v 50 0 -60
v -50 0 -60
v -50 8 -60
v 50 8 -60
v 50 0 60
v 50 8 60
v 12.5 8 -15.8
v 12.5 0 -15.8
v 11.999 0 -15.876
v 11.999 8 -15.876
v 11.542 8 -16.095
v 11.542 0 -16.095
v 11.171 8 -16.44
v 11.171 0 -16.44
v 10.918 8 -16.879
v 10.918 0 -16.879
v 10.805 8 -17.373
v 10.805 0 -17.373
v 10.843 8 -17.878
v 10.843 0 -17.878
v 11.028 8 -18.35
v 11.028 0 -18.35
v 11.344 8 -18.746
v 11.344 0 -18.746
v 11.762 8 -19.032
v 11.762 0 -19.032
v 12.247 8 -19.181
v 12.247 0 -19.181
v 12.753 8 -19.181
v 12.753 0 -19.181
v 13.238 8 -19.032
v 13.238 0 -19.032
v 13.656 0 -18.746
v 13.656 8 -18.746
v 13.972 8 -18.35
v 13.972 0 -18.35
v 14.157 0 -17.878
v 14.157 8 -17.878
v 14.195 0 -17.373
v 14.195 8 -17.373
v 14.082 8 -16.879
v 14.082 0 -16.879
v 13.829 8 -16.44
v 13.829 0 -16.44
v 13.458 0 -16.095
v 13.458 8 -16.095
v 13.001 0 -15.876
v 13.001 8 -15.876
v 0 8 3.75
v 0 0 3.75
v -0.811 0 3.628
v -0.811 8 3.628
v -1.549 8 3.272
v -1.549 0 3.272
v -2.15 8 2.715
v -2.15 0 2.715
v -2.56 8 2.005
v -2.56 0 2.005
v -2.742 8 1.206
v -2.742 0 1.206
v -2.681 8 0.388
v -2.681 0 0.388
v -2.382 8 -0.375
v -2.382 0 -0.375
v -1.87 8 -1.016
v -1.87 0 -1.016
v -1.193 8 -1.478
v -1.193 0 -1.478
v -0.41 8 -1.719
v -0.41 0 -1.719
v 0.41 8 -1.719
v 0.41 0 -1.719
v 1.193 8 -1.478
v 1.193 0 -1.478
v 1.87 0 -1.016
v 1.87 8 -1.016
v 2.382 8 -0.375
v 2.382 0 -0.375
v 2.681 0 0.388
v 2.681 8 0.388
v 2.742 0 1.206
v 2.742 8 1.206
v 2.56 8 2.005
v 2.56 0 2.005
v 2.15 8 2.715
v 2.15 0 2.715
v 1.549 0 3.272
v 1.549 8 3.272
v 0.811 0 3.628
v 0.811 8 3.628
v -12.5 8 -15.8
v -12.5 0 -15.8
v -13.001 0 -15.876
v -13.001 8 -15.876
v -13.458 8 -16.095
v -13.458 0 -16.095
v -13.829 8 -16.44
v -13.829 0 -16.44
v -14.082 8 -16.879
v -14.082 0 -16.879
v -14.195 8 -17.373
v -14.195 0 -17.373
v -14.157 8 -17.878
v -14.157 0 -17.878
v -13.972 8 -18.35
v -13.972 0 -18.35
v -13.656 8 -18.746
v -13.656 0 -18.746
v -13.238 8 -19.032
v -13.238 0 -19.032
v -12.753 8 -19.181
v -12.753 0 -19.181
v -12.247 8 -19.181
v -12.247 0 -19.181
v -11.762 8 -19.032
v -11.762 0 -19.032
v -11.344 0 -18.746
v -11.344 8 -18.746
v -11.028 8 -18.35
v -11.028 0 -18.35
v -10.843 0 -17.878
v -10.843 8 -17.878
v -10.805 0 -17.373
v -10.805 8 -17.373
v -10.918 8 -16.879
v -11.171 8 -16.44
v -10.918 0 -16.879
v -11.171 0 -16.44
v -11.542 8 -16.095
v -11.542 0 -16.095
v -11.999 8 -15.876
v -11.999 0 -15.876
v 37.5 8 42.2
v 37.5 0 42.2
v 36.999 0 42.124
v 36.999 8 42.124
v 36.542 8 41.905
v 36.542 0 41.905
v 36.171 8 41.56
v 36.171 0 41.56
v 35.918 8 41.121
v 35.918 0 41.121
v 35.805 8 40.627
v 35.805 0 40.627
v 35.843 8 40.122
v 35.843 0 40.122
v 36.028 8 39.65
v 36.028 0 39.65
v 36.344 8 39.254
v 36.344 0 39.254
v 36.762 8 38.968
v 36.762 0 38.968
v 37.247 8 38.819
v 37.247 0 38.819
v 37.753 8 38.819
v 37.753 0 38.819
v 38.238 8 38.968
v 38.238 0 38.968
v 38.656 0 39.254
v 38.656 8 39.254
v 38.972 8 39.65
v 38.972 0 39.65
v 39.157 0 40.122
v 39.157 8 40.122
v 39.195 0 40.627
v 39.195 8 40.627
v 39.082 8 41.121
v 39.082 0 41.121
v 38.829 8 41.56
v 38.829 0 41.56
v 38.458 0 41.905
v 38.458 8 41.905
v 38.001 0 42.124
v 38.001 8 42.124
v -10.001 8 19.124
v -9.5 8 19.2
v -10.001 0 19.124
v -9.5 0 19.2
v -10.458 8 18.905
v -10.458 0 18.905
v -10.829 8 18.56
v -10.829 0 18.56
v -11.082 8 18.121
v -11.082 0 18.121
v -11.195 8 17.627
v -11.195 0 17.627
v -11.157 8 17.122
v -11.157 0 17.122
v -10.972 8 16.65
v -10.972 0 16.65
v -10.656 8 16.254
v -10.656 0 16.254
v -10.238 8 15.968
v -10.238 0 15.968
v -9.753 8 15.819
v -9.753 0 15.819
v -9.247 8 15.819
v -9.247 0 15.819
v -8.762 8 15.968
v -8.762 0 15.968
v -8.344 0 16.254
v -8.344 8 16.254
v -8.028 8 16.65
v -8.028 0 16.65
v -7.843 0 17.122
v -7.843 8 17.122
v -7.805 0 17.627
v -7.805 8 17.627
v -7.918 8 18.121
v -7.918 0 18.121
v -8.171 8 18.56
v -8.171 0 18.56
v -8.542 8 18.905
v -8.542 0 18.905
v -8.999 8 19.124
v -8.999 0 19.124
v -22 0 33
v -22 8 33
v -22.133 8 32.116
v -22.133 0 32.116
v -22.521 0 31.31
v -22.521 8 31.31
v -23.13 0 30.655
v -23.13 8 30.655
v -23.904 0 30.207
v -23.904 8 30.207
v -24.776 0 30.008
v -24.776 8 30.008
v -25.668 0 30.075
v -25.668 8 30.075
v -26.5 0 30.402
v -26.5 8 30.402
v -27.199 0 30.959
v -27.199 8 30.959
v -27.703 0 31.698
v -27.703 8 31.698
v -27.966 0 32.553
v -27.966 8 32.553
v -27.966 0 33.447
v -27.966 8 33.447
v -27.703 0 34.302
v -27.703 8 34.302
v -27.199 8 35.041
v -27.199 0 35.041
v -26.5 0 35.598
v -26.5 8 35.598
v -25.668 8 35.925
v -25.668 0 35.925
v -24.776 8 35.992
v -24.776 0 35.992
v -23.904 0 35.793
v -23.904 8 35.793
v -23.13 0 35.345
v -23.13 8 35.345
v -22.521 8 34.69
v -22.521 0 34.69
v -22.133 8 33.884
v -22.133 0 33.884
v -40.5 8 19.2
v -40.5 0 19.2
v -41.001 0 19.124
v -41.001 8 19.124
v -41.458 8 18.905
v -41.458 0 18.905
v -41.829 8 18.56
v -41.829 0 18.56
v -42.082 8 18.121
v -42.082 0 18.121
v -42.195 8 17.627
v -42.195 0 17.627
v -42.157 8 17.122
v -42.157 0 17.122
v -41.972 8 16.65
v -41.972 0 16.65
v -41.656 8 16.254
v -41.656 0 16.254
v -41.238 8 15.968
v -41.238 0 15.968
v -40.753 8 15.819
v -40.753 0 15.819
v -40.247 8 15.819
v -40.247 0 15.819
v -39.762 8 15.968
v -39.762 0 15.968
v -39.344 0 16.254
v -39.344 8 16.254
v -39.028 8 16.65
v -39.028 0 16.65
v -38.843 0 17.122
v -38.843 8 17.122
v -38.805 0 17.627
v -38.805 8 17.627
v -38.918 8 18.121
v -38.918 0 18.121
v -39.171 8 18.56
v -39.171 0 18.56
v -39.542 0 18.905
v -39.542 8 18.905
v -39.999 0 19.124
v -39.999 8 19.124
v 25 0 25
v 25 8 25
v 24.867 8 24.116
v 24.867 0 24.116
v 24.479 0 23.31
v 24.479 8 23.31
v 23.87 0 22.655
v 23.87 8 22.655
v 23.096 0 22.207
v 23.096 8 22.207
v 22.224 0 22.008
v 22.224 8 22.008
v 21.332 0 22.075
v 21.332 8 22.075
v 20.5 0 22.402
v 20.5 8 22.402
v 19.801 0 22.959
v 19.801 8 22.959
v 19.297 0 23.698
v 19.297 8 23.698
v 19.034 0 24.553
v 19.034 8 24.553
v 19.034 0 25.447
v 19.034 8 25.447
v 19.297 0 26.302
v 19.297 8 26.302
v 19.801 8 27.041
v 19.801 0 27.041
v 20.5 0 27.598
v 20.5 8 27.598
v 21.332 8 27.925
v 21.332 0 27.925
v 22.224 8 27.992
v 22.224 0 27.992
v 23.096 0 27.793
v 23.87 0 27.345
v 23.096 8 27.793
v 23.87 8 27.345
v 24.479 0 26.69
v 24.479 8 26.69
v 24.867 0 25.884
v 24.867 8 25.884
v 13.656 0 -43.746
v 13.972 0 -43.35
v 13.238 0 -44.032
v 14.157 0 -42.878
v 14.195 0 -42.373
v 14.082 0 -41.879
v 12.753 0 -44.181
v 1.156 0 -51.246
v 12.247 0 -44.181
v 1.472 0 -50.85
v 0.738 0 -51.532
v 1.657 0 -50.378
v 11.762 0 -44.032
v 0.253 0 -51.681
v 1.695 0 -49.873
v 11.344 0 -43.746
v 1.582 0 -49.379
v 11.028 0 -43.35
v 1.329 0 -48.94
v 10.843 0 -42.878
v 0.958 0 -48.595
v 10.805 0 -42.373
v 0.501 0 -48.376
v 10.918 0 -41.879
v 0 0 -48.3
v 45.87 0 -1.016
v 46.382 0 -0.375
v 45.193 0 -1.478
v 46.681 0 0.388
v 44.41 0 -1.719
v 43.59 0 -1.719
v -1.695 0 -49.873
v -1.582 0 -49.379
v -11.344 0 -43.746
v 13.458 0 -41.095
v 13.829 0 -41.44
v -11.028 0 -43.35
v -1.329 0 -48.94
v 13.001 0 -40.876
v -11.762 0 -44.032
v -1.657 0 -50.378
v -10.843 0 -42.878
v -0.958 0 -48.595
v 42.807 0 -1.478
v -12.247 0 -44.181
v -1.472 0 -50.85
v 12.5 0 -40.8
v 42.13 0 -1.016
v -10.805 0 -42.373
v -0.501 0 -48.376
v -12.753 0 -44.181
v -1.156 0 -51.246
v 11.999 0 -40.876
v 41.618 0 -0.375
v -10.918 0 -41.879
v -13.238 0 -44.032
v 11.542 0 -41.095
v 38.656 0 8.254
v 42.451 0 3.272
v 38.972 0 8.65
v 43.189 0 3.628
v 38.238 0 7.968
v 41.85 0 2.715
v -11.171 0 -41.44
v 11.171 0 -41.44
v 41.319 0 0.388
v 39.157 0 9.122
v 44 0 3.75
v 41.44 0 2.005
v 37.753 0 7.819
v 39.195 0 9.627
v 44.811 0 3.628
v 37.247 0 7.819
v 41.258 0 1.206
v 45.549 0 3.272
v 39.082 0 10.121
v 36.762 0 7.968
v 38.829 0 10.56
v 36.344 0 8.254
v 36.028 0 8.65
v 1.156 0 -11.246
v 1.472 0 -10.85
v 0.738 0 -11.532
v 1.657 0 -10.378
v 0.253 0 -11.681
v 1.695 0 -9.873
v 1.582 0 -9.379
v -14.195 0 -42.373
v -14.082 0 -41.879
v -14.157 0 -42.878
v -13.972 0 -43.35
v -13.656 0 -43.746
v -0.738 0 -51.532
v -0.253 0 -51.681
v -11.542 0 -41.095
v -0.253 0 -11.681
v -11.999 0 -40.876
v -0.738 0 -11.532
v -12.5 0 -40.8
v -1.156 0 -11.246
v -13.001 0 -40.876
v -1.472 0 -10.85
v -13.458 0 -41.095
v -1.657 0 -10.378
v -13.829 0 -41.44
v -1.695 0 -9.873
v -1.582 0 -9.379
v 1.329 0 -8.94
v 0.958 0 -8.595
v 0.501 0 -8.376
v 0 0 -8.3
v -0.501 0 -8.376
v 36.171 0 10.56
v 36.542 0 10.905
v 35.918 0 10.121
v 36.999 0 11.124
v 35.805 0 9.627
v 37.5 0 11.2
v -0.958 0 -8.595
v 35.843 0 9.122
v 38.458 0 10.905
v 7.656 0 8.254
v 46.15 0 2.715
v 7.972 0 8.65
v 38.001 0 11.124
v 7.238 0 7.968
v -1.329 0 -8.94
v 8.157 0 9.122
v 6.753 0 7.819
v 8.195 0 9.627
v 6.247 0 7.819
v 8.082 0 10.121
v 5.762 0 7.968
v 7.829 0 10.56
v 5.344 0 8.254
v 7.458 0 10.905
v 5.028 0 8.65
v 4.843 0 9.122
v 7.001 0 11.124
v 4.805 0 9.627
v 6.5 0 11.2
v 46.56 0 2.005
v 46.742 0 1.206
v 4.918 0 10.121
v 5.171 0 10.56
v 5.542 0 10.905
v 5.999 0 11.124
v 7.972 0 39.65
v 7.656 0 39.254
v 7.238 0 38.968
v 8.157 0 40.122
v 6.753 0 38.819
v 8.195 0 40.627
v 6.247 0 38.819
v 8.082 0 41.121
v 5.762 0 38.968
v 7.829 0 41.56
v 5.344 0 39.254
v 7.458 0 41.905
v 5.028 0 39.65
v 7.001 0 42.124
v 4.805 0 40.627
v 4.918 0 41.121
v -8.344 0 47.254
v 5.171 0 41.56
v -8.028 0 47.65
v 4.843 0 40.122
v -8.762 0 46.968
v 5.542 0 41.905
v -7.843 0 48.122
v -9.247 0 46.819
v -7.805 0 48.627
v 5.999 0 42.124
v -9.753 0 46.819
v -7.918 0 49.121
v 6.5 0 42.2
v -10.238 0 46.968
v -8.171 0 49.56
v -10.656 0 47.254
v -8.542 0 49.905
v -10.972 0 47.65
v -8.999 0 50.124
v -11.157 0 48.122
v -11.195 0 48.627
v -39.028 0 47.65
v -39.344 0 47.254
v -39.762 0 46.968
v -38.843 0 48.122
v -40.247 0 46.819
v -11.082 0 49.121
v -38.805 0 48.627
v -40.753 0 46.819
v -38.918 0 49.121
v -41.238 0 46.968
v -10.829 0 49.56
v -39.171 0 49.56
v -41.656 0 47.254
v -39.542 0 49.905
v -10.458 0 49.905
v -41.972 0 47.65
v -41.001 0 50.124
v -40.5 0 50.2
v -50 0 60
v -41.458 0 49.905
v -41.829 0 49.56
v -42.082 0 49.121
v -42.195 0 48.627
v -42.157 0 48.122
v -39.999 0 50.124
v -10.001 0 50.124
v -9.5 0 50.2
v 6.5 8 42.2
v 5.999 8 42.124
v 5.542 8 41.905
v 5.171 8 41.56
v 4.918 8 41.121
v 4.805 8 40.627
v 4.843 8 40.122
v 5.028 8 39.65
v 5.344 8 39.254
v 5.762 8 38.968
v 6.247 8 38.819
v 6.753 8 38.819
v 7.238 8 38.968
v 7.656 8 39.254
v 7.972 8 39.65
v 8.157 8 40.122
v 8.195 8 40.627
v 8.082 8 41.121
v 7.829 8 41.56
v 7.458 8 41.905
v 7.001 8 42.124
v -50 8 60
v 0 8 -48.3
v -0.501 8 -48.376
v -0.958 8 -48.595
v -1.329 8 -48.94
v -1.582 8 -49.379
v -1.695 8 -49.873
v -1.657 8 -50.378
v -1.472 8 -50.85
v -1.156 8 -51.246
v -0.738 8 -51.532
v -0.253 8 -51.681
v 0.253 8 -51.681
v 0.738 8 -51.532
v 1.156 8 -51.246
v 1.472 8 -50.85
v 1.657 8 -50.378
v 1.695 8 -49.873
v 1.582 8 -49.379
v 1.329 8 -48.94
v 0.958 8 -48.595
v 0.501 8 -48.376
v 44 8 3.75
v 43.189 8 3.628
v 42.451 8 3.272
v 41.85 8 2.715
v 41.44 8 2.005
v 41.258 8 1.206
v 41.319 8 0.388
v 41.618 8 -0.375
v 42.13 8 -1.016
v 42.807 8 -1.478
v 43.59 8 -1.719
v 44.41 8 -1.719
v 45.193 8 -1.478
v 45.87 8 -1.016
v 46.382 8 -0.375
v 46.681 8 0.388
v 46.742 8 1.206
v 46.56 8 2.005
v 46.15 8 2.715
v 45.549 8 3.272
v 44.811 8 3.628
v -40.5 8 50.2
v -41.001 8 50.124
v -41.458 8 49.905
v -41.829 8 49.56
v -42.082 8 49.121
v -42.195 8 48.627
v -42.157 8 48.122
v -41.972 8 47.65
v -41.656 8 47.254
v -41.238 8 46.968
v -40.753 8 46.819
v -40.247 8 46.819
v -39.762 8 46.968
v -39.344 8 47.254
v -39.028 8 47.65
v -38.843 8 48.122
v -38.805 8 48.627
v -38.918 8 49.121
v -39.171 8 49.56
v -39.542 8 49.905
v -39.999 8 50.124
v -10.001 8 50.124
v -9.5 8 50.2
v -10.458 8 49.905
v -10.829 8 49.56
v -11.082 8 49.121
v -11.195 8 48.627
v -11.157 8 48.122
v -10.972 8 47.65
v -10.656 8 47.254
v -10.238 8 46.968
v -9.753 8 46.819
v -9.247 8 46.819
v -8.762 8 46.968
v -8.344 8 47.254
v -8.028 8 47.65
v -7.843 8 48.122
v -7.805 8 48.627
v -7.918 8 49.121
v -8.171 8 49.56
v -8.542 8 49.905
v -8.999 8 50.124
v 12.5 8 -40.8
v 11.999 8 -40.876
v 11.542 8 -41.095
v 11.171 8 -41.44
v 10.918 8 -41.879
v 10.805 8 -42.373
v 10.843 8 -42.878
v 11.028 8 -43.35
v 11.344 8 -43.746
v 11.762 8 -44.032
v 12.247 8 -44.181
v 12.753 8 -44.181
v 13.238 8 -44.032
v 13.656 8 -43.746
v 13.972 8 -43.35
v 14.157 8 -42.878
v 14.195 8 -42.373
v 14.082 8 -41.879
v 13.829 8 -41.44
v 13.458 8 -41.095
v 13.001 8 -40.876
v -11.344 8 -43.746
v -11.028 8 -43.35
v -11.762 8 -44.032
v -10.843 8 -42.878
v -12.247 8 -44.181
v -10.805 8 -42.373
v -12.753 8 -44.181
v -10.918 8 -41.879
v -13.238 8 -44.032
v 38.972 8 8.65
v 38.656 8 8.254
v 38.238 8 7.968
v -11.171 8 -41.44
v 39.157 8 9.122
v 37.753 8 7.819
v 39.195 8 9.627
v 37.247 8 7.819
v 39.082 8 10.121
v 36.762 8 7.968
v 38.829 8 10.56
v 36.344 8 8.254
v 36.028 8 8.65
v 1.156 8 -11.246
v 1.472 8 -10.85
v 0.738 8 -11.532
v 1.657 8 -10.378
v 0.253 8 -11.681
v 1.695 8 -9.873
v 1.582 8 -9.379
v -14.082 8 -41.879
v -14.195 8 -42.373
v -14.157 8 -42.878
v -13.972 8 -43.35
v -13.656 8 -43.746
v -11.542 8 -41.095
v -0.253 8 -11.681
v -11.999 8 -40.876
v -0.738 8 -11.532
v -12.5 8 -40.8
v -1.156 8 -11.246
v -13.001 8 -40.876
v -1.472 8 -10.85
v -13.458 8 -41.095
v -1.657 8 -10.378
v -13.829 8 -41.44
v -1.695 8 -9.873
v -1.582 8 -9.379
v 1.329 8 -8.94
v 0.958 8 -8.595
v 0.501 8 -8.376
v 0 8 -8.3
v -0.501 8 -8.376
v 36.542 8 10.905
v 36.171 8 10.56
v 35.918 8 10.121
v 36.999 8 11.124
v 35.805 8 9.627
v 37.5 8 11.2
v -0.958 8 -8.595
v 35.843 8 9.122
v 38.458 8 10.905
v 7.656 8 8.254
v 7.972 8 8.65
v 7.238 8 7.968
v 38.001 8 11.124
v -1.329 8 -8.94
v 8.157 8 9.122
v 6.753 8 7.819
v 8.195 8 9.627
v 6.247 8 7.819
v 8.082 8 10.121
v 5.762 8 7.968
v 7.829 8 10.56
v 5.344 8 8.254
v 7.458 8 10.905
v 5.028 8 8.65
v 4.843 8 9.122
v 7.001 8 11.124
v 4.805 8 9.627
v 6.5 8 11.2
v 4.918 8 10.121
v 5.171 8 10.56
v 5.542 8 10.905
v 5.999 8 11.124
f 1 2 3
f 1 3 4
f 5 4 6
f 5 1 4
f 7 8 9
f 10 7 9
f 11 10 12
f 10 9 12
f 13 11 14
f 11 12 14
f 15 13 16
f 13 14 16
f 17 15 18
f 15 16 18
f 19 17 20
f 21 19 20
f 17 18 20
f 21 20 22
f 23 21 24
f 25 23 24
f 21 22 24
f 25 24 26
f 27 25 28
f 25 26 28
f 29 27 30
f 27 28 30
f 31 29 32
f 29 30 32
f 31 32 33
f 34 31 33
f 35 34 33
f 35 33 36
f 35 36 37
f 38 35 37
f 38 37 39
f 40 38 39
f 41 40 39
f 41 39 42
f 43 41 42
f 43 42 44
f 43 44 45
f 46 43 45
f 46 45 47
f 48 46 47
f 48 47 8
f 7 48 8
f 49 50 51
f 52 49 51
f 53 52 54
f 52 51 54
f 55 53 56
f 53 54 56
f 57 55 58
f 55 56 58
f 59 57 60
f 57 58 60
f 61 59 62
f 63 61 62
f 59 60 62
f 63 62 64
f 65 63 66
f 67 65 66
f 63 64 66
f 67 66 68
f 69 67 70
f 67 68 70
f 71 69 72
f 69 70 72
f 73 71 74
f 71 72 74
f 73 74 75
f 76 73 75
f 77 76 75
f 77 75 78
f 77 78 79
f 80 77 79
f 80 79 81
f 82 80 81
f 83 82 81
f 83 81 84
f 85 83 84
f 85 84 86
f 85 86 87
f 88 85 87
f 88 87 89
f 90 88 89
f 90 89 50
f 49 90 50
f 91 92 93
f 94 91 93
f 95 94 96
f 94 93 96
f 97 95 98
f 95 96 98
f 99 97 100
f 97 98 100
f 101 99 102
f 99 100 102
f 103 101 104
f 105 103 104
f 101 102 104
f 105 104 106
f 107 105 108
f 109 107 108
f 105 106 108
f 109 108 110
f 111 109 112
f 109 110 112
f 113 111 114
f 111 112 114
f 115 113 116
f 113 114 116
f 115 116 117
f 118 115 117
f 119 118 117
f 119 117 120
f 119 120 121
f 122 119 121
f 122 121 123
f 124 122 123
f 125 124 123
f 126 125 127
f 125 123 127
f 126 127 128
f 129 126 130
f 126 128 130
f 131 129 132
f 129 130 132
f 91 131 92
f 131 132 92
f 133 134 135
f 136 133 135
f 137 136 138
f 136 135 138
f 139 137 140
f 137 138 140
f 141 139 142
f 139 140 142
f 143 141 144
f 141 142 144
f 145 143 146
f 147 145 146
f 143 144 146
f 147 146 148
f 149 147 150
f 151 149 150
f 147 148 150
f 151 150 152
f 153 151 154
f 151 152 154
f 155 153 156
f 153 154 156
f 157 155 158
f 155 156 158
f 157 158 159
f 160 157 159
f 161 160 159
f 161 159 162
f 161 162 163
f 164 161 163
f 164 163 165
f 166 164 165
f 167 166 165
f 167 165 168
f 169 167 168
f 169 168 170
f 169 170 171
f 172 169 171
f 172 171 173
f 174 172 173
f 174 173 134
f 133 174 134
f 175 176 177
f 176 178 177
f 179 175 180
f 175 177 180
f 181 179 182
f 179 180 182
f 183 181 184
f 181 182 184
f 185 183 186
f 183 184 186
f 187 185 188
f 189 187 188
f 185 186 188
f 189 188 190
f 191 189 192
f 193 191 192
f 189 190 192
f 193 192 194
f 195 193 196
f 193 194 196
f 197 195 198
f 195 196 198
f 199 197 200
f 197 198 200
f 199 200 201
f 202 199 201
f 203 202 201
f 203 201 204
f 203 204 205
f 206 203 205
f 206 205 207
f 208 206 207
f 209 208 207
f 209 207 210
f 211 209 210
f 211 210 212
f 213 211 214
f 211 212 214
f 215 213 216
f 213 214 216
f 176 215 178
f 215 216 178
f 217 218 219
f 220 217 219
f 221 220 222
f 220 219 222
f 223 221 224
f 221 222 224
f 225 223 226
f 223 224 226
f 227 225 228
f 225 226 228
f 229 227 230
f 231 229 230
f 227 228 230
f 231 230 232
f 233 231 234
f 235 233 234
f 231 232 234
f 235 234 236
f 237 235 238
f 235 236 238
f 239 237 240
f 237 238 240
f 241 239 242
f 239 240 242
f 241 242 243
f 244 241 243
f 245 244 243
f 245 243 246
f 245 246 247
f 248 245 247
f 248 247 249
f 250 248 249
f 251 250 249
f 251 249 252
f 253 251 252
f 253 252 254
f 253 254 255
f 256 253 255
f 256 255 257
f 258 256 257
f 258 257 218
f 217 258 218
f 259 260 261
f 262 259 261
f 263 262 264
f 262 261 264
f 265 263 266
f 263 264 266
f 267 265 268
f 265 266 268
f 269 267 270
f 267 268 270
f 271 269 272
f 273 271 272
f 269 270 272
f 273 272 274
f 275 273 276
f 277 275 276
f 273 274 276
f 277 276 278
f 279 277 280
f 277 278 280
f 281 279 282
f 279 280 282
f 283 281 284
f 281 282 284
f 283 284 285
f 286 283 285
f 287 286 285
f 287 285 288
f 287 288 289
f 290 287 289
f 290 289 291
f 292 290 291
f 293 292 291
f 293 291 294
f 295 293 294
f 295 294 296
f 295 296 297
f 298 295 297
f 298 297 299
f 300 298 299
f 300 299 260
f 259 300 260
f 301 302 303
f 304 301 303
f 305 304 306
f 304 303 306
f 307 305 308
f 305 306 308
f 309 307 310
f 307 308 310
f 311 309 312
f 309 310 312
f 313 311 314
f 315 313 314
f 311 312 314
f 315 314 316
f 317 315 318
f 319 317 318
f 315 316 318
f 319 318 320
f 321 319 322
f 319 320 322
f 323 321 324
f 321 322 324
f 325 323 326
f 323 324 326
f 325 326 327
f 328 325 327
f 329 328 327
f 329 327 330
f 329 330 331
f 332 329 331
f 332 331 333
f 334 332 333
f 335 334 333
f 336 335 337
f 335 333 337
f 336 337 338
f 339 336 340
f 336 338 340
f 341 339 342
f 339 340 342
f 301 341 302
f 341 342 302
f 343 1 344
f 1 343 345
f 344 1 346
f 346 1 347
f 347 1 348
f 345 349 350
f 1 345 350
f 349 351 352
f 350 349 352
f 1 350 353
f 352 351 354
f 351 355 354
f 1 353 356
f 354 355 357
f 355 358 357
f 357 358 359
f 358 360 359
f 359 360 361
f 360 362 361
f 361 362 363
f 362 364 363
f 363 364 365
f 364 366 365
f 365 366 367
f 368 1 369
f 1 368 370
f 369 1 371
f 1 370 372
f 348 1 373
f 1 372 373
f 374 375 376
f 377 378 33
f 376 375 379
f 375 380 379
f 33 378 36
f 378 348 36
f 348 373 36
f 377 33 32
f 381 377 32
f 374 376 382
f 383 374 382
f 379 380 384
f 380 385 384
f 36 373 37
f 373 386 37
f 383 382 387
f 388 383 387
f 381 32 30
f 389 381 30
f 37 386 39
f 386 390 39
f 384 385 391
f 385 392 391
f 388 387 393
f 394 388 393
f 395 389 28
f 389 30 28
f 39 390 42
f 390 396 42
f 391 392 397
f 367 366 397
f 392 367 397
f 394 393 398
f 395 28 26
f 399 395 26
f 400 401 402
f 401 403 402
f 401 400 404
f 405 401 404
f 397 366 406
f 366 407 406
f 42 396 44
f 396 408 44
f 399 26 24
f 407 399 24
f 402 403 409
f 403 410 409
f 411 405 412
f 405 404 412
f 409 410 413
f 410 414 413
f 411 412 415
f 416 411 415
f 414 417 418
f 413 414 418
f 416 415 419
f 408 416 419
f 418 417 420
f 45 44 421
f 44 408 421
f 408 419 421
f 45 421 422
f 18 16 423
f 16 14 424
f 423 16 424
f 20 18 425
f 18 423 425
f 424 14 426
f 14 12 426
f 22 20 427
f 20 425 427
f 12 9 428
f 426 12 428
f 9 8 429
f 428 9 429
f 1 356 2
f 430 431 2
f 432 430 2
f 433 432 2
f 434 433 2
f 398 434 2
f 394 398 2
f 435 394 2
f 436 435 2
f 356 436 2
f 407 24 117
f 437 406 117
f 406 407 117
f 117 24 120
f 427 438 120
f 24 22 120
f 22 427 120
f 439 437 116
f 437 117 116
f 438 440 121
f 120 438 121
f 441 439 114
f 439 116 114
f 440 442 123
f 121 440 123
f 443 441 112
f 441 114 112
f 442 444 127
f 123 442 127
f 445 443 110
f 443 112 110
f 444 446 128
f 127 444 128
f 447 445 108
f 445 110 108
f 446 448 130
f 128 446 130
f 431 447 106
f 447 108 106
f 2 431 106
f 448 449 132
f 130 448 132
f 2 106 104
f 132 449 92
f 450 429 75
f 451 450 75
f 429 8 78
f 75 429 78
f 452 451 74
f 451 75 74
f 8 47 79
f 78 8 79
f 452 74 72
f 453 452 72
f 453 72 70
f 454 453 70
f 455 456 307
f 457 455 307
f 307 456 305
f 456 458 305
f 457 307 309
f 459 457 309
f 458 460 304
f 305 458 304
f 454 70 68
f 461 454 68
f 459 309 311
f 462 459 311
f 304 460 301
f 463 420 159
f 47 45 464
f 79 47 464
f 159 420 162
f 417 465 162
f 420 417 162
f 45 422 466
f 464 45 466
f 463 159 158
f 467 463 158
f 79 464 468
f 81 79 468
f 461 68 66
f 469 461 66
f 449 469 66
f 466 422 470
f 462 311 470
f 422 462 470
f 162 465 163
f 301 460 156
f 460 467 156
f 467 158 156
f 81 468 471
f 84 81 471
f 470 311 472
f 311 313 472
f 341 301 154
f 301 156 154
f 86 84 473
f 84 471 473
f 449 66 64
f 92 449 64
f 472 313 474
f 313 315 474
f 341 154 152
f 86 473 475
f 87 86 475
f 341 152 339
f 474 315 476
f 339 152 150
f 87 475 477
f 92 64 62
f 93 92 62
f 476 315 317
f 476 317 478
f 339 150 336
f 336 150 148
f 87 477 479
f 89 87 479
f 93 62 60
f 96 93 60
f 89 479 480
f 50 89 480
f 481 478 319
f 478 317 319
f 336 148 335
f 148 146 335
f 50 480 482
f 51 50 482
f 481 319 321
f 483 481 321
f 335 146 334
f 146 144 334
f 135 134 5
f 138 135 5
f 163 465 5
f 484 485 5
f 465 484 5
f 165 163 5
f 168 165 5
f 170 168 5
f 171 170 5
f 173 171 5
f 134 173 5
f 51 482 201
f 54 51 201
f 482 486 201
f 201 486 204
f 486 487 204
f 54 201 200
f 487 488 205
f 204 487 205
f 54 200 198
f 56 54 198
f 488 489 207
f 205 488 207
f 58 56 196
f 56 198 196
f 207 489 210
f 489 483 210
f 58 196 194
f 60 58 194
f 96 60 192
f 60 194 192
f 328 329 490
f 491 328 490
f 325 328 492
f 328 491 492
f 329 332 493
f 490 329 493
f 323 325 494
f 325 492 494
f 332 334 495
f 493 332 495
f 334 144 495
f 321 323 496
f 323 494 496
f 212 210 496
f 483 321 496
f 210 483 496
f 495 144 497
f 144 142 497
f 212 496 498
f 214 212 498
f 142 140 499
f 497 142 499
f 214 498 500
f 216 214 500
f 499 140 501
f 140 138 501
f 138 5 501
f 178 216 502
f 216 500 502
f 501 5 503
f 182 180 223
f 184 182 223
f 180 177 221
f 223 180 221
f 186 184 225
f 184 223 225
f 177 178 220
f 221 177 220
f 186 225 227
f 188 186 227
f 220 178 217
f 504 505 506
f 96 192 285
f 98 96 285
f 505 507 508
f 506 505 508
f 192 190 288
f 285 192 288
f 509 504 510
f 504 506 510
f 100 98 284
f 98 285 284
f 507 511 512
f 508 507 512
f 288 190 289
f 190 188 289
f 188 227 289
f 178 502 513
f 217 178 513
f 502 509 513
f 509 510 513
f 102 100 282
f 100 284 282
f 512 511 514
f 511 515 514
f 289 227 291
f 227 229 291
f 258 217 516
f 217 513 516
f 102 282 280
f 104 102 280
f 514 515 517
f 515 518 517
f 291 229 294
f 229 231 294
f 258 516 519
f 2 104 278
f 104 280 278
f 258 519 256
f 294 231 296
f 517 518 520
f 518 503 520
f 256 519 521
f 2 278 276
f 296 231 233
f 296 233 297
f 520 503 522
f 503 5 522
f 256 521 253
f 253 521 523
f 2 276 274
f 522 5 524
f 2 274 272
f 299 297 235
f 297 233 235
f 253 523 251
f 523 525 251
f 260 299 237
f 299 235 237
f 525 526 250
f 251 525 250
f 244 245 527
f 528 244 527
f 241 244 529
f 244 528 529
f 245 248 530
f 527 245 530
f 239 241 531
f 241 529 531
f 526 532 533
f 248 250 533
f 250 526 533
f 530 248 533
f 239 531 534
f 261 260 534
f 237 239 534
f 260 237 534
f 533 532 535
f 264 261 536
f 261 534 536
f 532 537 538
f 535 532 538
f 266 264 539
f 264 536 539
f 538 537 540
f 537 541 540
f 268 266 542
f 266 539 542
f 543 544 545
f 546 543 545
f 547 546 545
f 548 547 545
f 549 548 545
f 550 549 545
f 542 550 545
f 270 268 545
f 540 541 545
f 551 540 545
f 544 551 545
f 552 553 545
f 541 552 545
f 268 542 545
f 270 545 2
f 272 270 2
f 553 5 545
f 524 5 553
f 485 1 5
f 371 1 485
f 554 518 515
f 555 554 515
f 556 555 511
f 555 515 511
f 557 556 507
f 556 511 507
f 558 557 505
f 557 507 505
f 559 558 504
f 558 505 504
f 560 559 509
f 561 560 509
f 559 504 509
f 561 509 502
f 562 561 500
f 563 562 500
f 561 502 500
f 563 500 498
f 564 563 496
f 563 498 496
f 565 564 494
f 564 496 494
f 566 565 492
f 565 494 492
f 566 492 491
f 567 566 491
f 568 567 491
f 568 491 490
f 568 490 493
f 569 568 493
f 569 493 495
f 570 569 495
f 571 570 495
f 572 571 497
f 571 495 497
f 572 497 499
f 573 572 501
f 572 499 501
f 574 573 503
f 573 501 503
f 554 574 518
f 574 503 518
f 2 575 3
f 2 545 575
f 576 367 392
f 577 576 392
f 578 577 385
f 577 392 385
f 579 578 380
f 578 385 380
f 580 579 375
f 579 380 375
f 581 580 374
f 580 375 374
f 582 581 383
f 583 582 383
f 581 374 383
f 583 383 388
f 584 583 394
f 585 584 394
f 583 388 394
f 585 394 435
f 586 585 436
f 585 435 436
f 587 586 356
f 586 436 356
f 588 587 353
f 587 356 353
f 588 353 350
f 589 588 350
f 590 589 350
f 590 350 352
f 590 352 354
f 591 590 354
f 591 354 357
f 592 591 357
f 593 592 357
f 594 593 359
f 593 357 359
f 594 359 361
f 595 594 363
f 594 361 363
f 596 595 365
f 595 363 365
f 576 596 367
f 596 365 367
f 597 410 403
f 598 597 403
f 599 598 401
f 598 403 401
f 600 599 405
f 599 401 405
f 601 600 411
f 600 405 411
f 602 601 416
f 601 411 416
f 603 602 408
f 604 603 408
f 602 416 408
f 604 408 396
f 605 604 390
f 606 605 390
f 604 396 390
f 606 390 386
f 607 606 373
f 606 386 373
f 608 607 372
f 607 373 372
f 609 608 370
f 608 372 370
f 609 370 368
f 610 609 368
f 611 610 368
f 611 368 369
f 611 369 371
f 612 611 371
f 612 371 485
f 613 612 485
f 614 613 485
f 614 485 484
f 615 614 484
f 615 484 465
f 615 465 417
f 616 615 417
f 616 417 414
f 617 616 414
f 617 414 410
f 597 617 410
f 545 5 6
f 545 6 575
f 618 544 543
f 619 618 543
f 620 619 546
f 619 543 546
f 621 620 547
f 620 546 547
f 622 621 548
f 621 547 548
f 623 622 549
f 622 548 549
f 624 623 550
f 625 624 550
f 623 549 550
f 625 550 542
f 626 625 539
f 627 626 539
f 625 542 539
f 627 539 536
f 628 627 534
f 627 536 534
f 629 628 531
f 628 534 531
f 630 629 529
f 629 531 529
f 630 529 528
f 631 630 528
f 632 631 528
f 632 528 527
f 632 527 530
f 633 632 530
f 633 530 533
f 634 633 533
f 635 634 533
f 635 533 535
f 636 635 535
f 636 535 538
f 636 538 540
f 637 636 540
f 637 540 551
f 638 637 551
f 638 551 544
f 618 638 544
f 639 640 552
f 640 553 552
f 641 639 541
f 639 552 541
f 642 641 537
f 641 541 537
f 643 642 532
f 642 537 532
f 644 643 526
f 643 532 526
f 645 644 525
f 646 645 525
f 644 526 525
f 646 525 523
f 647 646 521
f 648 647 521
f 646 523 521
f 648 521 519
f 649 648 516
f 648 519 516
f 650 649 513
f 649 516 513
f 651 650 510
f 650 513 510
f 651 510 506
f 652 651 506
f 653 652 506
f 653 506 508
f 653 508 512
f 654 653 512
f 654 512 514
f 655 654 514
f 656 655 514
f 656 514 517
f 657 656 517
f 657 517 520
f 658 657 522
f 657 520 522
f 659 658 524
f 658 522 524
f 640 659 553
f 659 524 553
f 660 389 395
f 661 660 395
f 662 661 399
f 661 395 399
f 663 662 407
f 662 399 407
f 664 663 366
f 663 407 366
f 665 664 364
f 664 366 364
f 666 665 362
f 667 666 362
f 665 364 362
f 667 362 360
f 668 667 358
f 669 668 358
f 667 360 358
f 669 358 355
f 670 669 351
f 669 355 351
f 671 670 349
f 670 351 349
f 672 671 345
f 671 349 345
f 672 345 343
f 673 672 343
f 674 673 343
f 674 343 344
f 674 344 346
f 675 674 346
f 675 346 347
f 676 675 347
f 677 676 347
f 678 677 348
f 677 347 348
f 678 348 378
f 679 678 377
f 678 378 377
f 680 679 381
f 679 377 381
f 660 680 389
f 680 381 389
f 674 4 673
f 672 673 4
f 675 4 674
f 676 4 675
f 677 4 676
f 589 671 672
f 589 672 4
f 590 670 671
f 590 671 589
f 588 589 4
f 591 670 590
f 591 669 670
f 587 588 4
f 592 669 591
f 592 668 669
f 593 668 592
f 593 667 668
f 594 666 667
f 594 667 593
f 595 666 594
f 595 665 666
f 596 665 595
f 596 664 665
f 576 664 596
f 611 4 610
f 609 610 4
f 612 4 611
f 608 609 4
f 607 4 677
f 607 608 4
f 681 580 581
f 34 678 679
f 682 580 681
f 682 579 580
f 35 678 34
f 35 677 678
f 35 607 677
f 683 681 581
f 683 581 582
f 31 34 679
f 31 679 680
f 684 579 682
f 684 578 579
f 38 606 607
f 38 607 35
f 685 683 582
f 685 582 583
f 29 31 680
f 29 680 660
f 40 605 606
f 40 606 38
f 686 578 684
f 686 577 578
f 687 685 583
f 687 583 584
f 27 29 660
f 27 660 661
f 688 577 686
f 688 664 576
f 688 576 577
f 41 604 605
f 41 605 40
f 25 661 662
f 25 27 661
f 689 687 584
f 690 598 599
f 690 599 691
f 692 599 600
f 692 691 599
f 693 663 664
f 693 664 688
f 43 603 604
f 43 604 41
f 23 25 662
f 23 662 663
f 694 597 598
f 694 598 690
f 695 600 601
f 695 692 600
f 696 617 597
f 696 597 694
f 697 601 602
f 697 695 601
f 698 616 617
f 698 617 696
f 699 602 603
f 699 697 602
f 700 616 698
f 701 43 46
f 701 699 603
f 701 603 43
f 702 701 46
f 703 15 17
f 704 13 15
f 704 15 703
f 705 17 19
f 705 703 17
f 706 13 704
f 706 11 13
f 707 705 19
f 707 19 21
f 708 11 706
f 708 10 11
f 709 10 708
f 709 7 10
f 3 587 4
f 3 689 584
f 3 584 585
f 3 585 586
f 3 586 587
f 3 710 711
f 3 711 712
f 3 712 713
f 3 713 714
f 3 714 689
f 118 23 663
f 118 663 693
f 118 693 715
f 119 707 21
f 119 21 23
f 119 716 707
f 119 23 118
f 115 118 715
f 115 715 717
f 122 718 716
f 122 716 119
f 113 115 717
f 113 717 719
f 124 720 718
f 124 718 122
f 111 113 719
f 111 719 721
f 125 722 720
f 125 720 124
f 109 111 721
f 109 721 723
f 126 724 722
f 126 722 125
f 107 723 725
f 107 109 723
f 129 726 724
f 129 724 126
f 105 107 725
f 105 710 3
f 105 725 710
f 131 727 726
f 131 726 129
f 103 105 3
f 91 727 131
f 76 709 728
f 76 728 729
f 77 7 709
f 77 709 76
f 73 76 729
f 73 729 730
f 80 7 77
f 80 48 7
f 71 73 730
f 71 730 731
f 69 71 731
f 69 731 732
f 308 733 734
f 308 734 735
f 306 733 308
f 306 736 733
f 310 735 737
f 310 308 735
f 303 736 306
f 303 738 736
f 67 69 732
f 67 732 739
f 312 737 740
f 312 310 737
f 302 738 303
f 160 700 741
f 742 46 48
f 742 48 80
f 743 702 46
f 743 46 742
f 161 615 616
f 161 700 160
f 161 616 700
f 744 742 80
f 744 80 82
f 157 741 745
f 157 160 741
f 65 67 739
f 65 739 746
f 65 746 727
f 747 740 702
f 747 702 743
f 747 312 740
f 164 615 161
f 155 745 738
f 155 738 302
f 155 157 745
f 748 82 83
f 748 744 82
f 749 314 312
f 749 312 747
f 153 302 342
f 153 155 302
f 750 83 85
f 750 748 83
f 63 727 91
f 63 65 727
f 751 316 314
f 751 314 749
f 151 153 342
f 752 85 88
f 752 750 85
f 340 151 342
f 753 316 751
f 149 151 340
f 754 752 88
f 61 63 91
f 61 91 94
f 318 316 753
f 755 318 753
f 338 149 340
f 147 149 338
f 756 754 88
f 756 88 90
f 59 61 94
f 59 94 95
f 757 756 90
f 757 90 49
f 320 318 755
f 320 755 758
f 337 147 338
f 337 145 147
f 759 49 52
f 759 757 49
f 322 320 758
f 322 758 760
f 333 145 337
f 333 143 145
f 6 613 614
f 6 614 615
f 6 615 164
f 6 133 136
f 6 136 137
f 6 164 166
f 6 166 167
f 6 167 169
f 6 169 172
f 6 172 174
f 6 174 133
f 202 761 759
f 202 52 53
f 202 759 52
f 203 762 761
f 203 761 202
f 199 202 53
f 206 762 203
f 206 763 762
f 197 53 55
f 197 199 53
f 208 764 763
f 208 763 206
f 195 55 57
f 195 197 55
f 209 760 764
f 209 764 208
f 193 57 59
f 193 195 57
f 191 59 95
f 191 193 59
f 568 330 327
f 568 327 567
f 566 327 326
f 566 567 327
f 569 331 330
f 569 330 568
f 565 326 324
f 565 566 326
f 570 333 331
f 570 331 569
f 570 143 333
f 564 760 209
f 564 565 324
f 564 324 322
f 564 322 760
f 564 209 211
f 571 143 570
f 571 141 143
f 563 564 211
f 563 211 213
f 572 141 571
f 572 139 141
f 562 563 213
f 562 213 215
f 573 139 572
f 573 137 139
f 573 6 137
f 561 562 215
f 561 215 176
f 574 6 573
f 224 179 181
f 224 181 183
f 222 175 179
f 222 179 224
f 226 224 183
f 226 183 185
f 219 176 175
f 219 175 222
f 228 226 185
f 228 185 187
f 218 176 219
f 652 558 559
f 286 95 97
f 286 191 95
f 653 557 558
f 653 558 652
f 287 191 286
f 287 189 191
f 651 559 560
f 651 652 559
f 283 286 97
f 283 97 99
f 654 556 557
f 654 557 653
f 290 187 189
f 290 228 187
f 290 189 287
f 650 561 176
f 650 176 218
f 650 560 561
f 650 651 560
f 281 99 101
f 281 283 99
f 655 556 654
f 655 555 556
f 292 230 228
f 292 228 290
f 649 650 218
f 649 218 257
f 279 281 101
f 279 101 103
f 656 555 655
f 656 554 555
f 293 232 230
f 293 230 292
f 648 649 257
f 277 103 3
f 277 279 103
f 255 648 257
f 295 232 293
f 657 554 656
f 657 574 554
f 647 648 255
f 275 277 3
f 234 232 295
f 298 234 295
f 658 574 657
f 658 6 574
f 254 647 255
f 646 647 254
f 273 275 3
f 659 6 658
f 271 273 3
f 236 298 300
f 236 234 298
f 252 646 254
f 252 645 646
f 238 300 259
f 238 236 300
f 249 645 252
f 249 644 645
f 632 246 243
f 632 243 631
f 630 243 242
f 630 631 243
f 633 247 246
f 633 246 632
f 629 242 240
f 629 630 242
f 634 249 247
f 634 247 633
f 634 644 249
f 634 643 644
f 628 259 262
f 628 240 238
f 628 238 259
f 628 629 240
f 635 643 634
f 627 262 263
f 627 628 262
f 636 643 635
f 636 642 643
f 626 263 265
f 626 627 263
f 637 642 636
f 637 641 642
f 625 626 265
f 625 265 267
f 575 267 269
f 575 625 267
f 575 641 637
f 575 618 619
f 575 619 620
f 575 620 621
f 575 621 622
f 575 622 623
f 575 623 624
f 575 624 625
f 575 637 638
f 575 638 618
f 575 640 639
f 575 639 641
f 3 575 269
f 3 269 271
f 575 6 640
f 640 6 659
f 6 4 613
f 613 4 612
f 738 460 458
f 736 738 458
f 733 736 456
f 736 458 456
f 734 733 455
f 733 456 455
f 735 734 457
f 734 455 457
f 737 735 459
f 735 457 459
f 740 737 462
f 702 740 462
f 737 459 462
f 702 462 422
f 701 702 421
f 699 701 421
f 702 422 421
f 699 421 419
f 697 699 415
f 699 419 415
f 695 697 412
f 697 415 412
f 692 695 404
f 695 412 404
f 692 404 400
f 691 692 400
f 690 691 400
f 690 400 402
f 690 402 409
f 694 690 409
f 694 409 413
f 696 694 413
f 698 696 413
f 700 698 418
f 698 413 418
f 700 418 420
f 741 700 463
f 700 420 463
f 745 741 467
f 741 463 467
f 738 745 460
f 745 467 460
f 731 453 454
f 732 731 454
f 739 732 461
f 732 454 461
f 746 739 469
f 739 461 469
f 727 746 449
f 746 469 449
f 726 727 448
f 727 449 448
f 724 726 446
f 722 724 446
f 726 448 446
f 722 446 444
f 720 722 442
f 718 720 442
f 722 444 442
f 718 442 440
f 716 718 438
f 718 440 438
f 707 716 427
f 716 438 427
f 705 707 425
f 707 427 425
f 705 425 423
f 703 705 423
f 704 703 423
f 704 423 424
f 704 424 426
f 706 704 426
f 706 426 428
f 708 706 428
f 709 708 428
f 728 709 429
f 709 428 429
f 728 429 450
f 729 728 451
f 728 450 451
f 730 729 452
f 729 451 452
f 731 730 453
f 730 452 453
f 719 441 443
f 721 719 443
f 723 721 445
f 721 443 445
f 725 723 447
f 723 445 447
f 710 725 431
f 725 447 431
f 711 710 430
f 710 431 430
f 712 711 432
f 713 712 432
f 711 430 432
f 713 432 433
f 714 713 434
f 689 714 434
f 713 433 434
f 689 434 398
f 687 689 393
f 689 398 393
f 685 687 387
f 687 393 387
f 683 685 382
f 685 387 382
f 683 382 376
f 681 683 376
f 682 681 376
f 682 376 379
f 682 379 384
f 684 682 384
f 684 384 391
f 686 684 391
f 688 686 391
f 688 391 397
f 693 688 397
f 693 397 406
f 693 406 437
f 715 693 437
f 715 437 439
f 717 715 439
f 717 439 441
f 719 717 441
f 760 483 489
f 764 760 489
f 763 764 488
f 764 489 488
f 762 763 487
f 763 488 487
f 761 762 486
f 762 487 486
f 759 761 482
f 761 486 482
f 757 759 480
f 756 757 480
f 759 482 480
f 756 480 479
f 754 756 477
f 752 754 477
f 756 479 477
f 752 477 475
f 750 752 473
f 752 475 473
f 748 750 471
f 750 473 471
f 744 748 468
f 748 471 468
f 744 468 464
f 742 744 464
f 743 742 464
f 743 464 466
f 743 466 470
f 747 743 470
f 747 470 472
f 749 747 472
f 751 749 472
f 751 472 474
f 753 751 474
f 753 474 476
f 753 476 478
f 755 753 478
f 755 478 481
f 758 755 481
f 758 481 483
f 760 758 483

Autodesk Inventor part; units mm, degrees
ref_plane "YZ Plane" through (0, 0, 0) normal (1, 0, 0) x (0, 1, 0)
ref_plane "XZ Plane" through (0, 0, 0) normal (0, 1, 0) x (-1, 0, 0)
ref_plane "XY Plane" through (0, 0, 0) normal (0, 0, 1) x (1, 0, 0)
sketch "Skizze1" plane through (0, 0, 0) normal (0, 1, 0) x (-1, 0, 0)
  line L0 (50, -60) -> (-50, -60)
  line L1 (-50, -60) -> (-50, 60)
  line L2 (-50, 60) -> (50, 60)
  line L3 (50, 60) -> (50, -60)
  line L4 (50, -60) -> (-50, 60) construction
  line L5 (-50, -60) -> (50, 60) construction
  point P0 (0, 0)
  dimension "d0" = 100
  dimension "d1" = 120
extrude "Extrusion1" add sketch "Skizze1" along normal blind 8
sketch "Skizze2" plane through (0, 8, 0) normal (0, 1, 0) x (1, 0, 0)
  line L0 (-50, -60) -> (50, -60) projected
  line L1 (0, -60) -> (0, 152.9688)
  line L2 (50, 60) -> (-50, 60) projected
  point P0 (0, 0)
  point P1 (0, 10)
  point P2 (0, 50)
  dimension "d4" = 40
  dimension "d5" = 10
hole "Rail_through_holes" at (0, 8, -10) at (0, 8, -50) direction (0, -1, 0) diameter 3.4 end through all clearance for "Inbusschraube ISO 4762" size "M3" standard "ISO"
sketch "Skizze3" plane through (0, 8, 0) normal (0, 1, 0) x (1, 0, 0)
  line L0 (-50, -60) -> (50, -60) projected
  line L1 (0, -60) -> (0, 60)
  line L2 (50, 60) -> (-50, 60) projected
  line L3 (12.5, 17.5) -> (-12.5, 17.5) construction
  line L4 (-12.5, 17.5) -> (-12.5, 42.5) construction
  line L5 (-12.5, 42.5) -> (12.5, 42.5) construction
  line L6 (12.5, 42.5) -> (12.5, 17.5) construction
  line L7 (12.5, 17.5) -> (-12.5, 42.5) construction
  line L8 (-12.5, 17.5) -> (12.5, 42.5) construction
  circle A0 centre (0, 50) radius 1.7 construction
  point P0 (0, 0)
  point P1 (0, 30)
  point P2 (0, 30)
  dimension "d13" = 25
  dimension "d14" = 25
  dimension "d15" = 20
hole "Slide_through_holes" at (-12.5, 8, -17.5) at (-12.5, 8, -42.5) at (12.5, 8, -42.5) at (12.5, 8, -17.5) direction (0, -1, 0) diameter 3.4 end through all clearance for "Inbusschraube ISO 4762" size "M3" standard "ISO"
sketch "Skizze4" plane through (0, 8, 0) normal (0, 1, 0) x (1, 0, 0)
  line L0 (-50, -60) -> (50, -60) projected
  line L1 (0, -60) -> (0, 74.7934)
  line L2 (-25, -60) -> (-25, 181.0187) construction
  line L3 (-9.5, -48.5) -> (-40.5, -48.5) construction
  line L4 (-40.5, -48.5) -> (-40.5, -17.5) construction
  line L5 (-40.5, -17.5) -> (-9.5, -17.5) construction
  line L6 (-9.5, -17.5) -> (-9.5, -48.5) construction
  line L7 (-9.5, -48.5) -> (-40.5, -17.5) construction
  line L8 (-40.5, -48.5) -> (-9.5, -17.5) construction
  line L9 (50, 60) -> (-50, 60) construction
  circle A0 centre (-25, -33) radius 3
  point P0 (0, 0)
  point P1 (-25, -33)
  dimension "d23" = 25
  dimension "d24" = 31
  dimension "d25" = 31
  dimension "d26" = 93
  dimension "d60" = 6
hole "Nema_X_through_holes" at (-40.5, 8, 48.5) at (-40.5, 8, 17.5) at (-9.5, 8, 17.5) at (-9.5, 8, 48.5) direction (0, -1, 0) diameter 3.4 end through all clearance for "Inbusschraube ISO 4762" size "M3" standard "ISO"
extrude "Nema_X_Shaft" cut sketch "Skizze4" against normal through all
sketch "Skizze5" plane through (0, 8, 0) normal (0, 1, 0) x (1, 0, 0)
  line L0 (-50, -60) -> (50, -60) projected
  line L1 (0, -60) -> (0, 63.3778)
  line L2 (22, -60) -> (22, 63.3778) construction
  line L3 (37.5, -40.5) -> (6.5, -40.5) construction
  line L4 (6.5, -40.5) -> (6.5, -9.5) construction
  line L5 (6.5, -9.5) -> (37.5, -9.5) construction
  line L6 (37.5, -9.5) -> (37.5, -40.5) construction
  line L7 (37.5, -40.5) -> (6.5, -9.5) construction
  line L8 (6.5, -40.5) -> (37.5, -9.5) construction
  circle A0 centre (22, -25) radius 3
  line L9 (50, 60) -> (-50, 60) projected
  line L10 (0, 88.0534) -> (0, -84.6756) projected
  point P0 (0, 0)
  point P1 (4.5, 5)
  point P2 (39.5, 5)
  point P3 (22, -25)
  dimension "d34" = 22
  dimension "d35" = 31
  dimension "d36" = 31
  dimension "d47" = 85
  dimension "d48" = 35
  dimension "d49" = 30
  dimension "d59" = 6
hole "Nema_Y_through_holes" at (6.5, 8, 40.5) at (6.5, 8, 9.5) at (37.5, 8, 9.5) at (37.5, 8, 40.5) direction (0, -1, 0) diameter 3.4 end through all clearance for "Inbusschraube ISO 4762" size "M3" standard "ISO"
extrude "Nema_Y_Shaft" cut sketch "Skizze5" against normal through all
sketch "Skizze6" plane through (0, 8, 0) normal (0, 1, 0) x (1, 0, 0)
  circle A0 centre (22, -25) radius 3 construction
  line L0 (22, -25) -> (22, 60.1123) construction
  line L1 (0, 84) -> (0, -84) construction
  point P0 (0, 0)
  point P1 (0, -1)
  point P2 (44, -1)
  dimension "d50" = 44
  dimension "d51" = 24
hole "Y_Pulley_Shafts" at (0, 8, 1) at (44, 8, 1) direction (0, -1, 0) diameter 5.5 end through all clearance for "Inbusschraube ISO 4762" size "M5" standard "ISO"
properties part number "14_XY_Plate" material "Aluminium 6061"
